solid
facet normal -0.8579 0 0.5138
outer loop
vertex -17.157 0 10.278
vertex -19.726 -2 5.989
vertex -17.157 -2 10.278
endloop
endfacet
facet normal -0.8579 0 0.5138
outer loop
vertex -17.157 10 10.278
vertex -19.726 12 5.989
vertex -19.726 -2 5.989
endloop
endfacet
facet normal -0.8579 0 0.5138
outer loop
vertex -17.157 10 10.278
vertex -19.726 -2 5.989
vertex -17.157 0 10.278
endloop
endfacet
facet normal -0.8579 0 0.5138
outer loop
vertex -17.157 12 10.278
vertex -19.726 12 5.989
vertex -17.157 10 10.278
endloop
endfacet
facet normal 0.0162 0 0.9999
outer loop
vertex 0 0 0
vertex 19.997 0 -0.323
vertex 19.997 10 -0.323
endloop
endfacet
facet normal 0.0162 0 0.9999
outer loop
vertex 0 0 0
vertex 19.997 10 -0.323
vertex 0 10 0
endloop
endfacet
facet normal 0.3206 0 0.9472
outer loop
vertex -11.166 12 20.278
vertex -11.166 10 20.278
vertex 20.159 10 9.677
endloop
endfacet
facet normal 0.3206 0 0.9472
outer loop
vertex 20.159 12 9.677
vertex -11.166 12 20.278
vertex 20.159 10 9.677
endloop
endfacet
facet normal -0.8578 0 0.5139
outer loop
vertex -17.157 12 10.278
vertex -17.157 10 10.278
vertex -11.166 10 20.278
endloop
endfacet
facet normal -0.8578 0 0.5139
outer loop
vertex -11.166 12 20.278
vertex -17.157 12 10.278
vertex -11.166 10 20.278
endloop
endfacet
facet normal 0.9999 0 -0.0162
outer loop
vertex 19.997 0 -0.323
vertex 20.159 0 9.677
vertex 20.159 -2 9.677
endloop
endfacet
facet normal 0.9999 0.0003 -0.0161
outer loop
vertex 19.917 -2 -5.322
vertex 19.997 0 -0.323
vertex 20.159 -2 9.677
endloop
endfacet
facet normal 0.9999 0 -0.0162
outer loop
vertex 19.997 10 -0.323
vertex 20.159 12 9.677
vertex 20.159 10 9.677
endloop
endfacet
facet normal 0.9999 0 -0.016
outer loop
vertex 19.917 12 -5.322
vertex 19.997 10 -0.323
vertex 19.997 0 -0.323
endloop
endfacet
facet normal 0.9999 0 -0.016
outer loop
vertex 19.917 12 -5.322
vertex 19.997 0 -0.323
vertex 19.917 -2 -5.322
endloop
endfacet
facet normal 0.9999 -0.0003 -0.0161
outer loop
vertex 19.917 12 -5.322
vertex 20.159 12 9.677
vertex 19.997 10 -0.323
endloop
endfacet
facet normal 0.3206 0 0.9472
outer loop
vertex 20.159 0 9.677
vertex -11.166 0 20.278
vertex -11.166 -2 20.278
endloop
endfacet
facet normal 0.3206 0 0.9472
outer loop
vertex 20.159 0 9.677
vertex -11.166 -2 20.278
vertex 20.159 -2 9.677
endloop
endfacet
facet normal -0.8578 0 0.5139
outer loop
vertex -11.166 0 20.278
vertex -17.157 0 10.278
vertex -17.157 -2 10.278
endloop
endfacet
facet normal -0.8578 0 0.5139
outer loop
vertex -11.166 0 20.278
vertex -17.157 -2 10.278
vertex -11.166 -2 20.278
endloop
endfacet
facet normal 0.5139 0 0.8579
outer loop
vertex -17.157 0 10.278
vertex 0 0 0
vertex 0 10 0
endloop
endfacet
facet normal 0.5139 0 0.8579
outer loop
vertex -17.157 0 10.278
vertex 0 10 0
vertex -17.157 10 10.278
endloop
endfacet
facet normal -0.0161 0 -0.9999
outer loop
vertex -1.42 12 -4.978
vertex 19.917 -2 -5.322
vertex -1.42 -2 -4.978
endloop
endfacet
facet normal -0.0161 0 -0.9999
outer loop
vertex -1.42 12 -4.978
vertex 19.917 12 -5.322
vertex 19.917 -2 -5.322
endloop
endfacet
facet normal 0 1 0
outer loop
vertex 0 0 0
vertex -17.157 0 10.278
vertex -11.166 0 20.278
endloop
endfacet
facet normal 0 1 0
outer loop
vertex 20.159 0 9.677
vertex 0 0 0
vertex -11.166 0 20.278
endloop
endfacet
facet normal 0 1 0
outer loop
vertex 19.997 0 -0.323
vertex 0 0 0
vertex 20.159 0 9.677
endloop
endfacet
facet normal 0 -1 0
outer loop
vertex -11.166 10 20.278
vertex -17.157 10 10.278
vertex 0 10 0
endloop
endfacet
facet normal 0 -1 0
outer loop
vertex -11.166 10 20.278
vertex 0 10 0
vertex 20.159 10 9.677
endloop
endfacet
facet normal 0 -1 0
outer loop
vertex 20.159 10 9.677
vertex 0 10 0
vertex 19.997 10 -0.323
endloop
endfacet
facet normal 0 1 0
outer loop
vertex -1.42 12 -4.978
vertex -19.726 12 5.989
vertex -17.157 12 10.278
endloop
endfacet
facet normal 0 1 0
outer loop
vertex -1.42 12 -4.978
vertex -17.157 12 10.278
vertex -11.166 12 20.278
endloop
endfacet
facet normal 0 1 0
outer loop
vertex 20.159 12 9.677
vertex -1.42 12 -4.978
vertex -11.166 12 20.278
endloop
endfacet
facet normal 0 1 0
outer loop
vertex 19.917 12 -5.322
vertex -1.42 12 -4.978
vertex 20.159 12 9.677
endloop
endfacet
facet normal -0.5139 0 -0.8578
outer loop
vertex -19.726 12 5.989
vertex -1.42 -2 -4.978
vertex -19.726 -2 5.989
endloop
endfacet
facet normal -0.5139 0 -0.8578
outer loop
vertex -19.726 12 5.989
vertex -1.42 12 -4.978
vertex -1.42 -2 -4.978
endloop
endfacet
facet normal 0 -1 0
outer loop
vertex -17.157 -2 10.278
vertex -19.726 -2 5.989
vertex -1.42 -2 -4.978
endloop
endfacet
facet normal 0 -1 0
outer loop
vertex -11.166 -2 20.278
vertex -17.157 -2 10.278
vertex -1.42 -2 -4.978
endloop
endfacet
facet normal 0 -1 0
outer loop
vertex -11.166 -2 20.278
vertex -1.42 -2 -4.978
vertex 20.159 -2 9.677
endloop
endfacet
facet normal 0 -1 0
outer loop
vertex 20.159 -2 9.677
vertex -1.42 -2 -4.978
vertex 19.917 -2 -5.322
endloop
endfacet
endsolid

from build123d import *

# Parameters (mm, degrees)
BOSS_EXTRUDE1_DEPTH = 10
BOSS_EXTRUDE2_DEPTH = 2


with BuildPart() as part:
    # Sketch3 → Boss-Extrude1 (new body)
    with BuildSketch(Plane(origin=(0, 0, 0), x_dir=(1, 0, 0), z_dir=(0, 1, 0))):
        Polygon((19.916769016, 5.321871098), (19.997399332, 0.322521265), (0, 0), (-17.156995198, -10.278011275), (-19.726498017, -5.988762475), (-1.420202067, 4.977745005), align=None)
    extrude(amount=BOSS_EXTRUDE1_DEPTH)

    # Sketch4 → Boss-Extrude2 (add)
    with BuildSketch(Plane(origin=(0, 10, 0), x_dir=(1, 0, 0), z_dir=(0, 1, 0))):
        Polygon((-19.726498017, -5.988762475), (-17.156995198, -10.278011275), (-11.166429161, -20.278011275), (20.158680936, -9.677478735), (19.997399332, 0.322521265), (19.916769016, 5.321871098), (-1.420202067, 4.977745005), align=None)
    boss_extrude2 = extrude(amount=BOSS_EXTRUDE2_DEPTH)

    # Mirror1: Boss-Extrude2 across plane
    add(boss_extrude2.mirror(Plane.ZX.offset(5)))


solid = part.part
